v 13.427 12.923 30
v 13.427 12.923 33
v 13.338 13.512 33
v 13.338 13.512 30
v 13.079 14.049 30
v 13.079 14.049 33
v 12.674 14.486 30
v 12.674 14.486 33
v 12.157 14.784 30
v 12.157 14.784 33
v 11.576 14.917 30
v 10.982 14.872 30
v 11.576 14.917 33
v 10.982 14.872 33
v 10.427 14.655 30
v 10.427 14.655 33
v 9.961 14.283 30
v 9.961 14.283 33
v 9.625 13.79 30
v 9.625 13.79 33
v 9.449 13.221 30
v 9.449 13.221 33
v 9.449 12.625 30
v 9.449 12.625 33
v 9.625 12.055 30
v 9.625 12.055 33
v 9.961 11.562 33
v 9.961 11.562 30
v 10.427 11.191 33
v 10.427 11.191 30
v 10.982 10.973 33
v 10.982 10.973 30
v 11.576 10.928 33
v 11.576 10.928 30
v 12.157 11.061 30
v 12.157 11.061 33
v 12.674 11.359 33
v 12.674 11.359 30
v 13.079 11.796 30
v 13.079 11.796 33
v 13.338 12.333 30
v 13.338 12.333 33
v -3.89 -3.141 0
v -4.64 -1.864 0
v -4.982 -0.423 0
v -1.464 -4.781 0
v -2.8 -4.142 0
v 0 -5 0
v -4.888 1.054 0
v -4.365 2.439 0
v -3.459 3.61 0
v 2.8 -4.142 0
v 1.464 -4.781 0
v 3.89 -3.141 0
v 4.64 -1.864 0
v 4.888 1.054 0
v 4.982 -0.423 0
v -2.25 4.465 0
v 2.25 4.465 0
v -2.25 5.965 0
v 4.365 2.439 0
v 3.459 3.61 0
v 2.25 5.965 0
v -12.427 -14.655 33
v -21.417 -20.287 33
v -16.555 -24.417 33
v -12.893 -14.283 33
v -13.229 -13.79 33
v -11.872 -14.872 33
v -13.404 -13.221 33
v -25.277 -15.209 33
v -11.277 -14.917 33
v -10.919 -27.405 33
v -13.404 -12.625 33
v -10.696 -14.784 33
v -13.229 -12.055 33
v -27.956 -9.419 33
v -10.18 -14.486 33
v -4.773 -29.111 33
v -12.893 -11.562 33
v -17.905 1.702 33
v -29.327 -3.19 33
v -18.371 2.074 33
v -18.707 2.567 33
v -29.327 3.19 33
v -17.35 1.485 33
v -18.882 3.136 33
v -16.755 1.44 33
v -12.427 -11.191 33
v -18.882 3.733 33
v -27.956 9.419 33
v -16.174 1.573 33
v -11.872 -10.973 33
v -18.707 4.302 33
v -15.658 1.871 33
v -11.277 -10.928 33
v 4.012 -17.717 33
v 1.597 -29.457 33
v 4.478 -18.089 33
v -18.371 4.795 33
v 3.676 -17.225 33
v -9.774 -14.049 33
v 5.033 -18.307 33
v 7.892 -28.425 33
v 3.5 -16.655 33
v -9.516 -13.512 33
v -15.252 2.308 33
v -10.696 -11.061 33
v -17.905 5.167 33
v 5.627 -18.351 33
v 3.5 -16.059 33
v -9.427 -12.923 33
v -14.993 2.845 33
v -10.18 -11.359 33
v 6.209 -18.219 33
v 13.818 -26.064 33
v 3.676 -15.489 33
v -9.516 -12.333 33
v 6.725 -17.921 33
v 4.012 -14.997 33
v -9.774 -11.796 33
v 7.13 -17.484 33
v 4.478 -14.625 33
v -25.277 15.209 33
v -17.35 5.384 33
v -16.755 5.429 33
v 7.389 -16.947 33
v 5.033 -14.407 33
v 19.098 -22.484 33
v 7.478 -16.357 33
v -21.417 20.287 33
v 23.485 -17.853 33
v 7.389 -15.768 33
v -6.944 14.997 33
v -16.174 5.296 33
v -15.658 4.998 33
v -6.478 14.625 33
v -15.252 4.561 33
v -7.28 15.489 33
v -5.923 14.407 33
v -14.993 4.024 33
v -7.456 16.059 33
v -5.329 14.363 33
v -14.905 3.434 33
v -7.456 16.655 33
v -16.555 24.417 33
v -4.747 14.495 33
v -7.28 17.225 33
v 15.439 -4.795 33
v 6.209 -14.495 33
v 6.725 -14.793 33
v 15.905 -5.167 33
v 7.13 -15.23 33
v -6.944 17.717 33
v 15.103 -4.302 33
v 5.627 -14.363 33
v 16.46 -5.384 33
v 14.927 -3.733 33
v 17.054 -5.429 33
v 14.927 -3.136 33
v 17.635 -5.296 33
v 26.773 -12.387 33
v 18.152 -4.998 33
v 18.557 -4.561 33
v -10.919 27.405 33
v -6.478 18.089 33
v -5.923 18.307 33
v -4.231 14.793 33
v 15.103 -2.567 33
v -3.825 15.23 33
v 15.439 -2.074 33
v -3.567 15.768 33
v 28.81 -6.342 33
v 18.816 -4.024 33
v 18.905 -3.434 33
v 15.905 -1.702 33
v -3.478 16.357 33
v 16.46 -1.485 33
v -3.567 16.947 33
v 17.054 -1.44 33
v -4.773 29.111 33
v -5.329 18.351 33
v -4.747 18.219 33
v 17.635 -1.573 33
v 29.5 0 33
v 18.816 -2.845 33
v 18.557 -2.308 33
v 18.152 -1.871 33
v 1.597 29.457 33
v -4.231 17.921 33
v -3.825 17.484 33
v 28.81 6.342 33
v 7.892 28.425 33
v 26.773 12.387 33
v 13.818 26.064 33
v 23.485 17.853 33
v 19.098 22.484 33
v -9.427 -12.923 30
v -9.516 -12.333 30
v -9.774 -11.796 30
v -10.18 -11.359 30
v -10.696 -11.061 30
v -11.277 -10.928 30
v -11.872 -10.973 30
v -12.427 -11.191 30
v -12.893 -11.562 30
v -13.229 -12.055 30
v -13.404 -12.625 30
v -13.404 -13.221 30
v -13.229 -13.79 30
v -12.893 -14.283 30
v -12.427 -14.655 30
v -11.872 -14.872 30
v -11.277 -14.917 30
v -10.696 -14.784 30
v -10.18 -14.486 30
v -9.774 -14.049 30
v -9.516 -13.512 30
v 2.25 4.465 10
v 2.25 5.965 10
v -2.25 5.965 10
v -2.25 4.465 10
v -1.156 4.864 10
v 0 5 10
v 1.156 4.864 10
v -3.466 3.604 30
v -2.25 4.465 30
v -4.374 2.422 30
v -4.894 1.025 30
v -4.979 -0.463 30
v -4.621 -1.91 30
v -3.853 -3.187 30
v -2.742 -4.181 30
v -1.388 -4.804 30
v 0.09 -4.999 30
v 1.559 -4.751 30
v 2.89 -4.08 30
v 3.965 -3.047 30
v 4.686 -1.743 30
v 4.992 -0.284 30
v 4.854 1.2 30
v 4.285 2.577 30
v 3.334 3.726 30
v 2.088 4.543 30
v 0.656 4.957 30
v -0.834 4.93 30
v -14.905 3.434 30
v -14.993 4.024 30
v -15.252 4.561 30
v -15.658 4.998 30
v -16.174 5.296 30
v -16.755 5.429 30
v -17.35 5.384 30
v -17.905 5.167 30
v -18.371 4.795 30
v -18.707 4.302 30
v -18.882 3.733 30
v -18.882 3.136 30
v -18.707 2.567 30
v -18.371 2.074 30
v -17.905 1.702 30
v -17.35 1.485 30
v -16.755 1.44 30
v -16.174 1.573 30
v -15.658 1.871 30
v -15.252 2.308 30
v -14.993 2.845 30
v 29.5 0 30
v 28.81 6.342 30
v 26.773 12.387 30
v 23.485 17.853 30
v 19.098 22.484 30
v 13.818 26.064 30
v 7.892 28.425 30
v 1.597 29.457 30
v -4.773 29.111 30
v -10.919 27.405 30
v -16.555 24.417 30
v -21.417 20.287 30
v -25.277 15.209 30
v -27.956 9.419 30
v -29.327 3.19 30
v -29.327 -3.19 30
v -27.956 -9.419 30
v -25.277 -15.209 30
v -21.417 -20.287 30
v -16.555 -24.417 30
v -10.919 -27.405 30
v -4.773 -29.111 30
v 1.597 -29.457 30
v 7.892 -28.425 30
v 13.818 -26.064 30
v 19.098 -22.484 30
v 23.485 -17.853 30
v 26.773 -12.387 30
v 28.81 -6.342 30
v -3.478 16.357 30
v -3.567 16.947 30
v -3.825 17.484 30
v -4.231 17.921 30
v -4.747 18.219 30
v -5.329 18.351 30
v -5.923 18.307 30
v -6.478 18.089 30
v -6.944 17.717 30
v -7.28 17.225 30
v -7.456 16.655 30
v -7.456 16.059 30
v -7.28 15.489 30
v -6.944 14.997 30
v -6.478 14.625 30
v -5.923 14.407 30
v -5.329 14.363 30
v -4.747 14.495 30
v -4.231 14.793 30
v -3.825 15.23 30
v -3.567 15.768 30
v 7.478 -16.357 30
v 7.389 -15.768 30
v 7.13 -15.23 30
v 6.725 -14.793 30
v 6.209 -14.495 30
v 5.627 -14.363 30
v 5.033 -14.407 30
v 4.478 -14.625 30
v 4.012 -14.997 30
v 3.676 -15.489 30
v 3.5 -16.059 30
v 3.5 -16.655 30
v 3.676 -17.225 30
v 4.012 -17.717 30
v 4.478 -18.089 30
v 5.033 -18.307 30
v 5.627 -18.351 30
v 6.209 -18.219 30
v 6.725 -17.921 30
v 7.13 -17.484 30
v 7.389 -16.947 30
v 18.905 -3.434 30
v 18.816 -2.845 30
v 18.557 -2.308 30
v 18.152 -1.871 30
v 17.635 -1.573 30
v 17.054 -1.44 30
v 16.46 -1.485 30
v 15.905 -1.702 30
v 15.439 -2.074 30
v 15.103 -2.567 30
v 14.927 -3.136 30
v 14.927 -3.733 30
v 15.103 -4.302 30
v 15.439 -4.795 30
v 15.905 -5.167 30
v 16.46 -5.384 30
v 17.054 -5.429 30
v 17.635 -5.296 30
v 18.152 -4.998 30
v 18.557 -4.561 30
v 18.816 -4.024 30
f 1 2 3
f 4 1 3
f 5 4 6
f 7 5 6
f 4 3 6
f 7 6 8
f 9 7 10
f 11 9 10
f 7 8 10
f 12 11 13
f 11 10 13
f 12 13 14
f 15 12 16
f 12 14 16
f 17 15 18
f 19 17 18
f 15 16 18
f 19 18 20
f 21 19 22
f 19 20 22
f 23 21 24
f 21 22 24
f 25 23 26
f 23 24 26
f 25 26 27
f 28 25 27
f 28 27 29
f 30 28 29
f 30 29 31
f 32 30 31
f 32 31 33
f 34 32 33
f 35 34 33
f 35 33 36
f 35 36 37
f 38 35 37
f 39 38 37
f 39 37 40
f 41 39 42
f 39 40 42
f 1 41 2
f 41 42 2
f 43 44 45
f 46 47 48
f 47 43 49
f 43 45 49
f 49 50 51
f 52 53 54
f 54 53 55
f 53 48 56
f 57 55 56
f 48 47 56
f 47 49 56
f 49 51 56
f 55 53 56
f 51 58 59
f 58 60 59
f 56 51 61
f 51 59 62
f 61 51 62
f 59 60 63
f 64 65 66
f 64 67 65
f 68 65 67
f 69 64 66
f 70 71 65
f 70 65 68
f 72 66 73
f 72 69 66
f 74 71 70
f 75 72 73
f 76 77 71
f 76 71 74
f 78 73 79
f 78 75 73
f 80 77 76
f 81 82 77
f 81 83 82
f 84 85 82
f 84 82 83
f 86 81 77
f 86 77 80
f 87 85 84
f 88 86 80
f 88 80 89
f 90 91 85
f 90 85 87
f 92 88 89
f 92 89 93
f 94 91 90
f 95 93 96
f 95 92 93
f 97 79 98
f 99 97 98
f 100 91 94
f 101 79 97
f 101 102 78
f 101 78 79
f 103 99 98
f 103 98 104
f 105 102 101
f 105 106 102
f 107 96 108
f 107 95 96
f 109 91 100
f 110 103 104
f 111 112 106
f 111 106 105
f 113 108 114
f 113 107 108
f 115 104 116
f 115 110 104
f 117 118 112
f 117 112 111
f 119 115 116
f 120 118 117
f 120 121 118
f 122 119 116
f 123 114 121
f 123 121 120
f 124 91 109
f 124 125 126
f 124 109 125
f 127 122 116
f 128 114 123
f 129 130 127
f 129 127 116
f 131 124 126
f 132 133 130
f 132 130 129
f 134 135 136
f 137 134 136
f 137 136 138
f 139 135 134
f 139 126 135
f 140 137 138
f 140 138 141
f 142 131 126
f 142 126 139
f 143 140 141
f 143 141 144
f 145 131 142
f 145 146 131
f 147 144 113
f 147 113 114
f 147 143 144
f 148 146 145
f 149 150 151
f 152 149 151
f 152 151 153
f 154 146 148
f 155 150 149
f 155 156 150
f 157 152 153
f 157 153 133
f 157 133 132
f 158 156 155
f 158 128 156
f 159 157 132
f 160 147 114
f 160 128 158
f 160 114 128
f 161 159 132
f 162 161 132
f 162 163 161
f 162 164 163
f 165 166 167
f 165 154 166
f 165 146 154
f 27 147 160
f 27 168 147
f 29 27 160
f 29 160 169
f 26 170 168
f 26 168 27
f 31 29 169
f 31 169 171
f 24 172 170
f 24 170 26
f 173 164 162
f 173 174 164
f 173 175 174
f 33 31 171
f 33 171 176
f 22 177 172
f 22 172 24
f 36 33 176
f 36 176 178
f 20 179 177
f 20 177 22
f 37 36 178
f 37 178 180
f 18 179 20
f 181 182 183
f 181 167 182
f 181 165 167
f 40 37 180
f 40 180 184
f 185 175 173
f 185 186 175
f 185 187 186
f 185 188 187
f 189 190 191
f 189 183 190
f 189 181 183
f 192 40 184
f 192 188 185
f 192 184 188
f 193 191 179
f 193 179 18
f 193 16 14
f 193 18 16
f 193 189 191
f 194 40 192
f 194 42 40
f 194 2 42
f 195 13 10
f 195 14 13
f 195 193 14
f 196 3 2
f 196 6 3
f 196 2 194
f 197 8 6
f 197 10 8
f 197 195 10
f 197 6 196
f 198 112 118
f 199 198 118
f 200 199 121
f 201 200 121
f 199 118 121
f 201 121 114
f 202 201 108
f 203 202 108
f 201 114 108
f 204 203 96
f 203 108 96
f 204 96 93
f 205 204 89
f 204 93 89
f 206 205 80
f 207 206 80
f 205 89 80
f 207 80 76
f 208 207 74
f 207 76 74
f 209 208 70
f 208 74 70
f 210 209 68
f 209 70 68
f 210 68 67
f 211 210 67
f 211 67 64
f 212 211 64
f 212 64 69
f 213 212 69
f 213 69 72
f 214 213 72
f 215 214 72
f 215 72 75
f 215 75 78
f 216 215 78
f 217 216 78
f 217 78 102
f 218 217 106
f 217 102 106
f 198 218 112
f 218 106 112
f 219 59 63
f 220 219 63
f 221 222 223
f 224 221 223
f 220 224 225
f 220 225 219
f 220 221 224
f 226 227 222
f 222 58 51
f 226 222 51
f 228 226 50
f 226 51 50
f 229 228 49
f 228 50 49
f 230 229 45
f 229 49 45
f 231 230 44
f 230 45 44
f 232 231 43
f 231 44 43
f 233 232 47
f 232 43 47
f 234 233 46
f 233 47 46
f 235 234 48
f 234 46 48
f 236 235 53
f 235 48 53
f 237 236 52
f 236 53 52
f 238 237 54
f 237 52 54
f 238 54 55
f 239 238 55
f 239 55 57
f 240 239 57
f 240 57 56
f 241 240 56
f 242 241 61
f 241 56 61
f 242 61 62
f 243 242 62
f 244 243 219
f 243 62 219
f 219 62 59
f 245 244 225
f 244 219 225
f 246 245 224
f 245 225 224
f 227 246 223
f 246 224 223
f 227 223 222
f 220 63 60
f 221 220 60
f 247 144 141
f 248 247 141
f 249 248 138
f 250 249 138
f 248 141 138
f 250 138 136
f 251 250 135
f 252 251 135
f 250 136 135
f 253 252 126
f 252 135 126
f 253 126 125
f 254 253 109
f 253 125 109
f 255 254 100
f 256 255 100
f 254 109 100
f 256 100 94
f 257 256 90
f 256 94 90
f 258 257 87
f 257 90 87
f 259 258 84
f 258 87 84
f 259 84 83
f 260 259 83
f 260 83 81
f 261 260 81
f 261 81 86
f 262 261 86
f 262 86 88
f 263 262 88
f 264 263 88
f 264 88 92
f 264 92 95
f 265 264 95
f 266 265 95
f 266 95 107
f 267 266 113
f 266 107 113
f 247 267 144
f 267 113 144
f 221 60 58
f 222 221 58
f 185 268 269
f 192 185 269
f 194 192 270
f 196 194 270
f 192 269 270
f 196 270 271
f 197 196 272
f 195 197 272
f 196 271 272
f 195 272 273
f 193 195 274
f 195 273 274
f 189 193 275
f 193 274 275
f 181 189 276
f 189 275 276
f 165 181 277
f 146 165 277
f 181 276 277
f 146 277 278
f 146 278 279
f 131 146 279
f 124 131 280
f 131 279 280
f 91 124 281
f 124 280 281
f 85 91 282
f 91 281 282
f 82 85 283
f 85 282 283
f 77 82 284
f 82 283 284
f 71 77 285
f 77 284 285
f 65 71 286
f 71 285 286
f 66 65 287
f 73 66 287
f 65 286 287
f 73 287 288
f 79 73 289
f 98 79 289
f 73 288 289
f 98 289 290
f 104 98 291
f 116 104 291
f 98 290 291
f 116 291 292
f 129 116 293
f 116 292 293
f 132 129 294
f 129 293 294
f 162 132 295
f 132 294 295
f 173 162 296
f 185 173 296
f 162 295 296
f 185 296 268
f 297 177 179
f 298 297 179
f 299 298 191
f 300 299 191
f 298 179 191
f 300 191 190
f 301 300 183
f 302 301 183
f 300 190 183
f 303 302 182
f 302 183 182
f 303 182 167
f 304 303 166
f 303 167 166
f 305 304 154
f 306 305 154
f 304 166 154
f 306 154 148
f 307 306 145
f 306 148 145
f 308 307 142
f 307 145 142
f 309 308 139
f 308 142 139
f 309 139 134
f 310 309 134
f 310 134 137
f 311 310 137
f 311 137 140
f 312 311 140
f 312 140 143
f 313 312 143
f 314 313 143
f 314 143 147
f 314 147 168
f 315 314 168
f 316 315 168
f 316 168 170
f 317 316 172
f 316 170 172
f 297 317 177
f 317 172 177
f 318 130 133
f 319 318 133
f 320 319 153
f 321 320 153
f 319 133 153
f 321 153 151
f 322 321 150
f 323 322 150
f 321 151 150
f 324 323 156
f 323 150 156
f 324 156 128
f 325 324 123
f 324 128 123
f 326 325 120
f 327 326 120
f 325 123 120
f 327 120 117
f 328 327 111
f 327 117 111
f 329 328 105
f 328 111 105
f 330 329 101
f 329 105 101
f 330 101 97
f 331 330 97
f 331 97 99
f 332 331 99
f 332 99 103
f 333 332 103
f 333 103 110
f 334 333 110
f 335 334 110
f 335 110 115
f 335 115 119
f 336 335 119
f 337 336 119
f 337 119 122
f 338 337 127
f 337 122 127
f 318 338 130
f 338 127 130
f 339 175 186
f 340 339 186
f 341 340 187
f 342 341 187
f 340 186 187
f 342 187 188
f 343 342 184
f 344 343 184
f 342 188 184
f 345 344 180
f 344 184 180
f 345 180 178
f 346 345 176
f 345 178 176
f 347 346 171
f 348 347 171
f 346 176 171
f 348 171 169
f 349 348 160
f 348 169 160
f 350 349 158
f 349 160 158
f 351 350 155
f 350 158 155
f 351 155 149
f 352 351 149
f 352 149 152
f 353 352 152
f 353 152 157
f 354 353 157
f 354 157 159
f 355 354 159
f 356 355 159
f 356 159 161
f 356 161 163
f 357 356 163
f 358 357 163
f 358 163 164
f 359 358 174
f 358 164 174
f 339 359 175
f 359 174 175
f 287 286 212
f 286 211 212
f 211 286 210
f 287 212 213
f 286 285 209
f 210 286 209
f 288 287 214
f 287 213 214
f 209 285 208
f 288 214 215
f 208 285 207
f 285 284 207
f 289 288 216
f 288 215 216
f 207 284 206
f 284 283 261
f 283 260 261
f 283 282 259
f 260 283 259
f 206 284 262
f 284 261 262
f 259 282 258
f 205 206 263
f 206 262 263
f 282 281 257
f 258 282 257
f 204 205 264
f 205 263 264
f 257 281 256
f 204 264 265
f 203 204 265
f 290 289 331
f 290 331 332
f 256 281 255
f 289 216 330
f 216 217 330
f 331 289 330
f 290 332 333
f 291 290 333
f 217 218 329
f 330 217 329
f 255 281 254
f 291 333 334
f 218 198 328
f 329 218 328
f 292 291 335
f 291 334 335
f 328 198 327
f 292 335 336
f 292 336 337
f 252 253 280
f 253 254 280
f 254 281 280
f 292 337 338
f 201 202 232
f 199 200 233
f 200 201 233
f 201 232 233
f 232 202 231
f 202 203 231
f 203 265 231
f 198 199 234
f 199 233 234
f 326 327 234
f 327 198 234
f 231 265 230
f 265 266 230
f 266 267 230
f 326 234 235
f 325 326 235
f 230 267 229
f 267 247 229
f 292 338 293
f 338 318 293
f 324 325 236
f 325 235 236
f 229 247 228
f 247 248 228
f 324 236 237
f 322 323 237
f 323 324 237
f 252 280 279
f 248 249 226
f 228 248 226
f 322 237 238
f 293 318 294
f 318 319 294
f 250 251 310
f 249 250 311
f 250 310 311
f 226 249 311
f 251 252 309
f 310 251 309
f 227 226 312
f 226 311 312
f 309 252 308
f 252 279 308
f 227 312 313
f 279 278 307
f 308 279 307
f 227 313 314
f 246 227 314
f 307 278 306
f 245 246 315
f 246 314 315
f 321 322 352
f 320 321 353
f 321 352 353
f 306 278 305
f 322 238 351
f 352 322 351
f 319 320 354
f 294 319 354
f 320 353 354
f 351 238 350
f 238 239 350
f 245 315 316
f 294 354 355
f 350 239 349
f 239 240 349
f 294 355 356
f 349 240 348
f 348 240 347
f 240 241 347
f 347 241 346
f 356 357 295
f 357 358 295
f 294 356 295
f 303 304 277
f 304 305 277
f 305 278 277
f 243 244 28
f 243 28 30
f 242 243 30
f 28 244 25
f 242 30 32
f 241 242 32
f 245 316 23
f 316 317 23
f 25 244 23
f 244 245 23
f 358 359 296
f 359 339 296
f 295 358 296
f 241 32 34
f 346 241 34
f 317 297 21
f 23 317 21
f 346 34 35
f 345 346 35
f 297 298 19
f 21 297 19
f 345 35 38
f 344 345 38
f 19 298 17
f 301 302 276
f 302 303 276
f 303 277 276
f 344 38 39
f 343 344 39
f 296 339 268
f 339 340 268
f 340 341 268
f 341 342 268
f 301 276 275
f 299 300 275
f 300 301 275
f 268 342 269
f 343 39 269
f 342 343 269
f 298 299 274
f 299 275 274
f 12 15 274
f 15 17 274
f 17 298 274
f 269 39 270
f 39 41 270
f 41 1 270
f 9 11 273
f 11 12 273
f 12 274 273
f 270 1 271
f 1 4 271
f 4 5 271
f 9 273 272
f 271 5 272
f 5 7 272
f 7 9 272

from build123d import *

# Parameters (mm, degrees)
EXTRUDE_1_DEPTH     = 10
EXTRUDE_2_DEPTH     = 30
SKETCH_3_R          = 29.5
EXTRUDE_3_DEPTH     = 3
SKETCH_4_R          = 2
CUT_EXTRUDE_1_DEPTH = 3


with BuildPart() as part:
    # 草图2 → 凸台-拉伸1 (new body)
    with BuildSketch(Plane.XY):
        with BuildLine():
            Line((2.25, 5.965142775), (-2.25, 5.965142775))
            Line((-2.25, 5.965142775), (-2.25, 4.465142775))
            ThreePointArc((-2.25, 4.465142775), (0, -5), (2.25, 4.465142775))
            Line((2.25, 4.465142775), (2.25, 5.965142775))
        make_face()
    extrude(amount=EXTRUDE_1_DEPTH)

    # 草图2<3> → 凸台-拉伸2 (add)
    with BuildSketch(Plane.XY):
        with BuildLine():
            ThreePointArc((2.25, 4.465142775), (0, 5), (-2.25, 4.465142775))
            ThreePointArc((-2.25, 4.465142775), (-2.62202212, -4.257346591), (5, 0))
            ThreePointArc((5, 0), (4.257346591, 2.62202212), (2.25, 4.465142775))
        make_face()
    extrude(amount=EXTRUDE_2_DEPTH)

    # 草图3 → 凸台-拉伸3 (add)
    with BuildSketch(Plane.XY.offset(30)):
        Circle(SKETCH_3_R)
    extrude(amount=EXTRUDE_3_DEPTH)

    # 草图4 → 切除-拉伸1 (cut)
    with BuildSketch(Plane.XY.offset(33)):
        with Locations((-5.477961715, 16.357091289)):
            Circle(SKETCH_4_R)
        with Locations((11.426675731, 12.922599651)):
            Circle(SKETCH_4_R)
        with Locations((16.904637446, -3.434491638)):
            Circle(SKETCH_4_R)
        with Locations((5.477961715, -16.357091289)):
            Circle(SKETCH_4_R)
        with Locations((-11.426675731, -12.922599651)):
            Circle(SKETCH_4_R)
        with Locations((-16.904637446, 3.434491638)):
            Circle(SKETCH_4_R)
    extrude(amount=-CUT_EXTRUDE_1_DEPTH, mode=Mode.SUBTRACT)


solid = part.part
